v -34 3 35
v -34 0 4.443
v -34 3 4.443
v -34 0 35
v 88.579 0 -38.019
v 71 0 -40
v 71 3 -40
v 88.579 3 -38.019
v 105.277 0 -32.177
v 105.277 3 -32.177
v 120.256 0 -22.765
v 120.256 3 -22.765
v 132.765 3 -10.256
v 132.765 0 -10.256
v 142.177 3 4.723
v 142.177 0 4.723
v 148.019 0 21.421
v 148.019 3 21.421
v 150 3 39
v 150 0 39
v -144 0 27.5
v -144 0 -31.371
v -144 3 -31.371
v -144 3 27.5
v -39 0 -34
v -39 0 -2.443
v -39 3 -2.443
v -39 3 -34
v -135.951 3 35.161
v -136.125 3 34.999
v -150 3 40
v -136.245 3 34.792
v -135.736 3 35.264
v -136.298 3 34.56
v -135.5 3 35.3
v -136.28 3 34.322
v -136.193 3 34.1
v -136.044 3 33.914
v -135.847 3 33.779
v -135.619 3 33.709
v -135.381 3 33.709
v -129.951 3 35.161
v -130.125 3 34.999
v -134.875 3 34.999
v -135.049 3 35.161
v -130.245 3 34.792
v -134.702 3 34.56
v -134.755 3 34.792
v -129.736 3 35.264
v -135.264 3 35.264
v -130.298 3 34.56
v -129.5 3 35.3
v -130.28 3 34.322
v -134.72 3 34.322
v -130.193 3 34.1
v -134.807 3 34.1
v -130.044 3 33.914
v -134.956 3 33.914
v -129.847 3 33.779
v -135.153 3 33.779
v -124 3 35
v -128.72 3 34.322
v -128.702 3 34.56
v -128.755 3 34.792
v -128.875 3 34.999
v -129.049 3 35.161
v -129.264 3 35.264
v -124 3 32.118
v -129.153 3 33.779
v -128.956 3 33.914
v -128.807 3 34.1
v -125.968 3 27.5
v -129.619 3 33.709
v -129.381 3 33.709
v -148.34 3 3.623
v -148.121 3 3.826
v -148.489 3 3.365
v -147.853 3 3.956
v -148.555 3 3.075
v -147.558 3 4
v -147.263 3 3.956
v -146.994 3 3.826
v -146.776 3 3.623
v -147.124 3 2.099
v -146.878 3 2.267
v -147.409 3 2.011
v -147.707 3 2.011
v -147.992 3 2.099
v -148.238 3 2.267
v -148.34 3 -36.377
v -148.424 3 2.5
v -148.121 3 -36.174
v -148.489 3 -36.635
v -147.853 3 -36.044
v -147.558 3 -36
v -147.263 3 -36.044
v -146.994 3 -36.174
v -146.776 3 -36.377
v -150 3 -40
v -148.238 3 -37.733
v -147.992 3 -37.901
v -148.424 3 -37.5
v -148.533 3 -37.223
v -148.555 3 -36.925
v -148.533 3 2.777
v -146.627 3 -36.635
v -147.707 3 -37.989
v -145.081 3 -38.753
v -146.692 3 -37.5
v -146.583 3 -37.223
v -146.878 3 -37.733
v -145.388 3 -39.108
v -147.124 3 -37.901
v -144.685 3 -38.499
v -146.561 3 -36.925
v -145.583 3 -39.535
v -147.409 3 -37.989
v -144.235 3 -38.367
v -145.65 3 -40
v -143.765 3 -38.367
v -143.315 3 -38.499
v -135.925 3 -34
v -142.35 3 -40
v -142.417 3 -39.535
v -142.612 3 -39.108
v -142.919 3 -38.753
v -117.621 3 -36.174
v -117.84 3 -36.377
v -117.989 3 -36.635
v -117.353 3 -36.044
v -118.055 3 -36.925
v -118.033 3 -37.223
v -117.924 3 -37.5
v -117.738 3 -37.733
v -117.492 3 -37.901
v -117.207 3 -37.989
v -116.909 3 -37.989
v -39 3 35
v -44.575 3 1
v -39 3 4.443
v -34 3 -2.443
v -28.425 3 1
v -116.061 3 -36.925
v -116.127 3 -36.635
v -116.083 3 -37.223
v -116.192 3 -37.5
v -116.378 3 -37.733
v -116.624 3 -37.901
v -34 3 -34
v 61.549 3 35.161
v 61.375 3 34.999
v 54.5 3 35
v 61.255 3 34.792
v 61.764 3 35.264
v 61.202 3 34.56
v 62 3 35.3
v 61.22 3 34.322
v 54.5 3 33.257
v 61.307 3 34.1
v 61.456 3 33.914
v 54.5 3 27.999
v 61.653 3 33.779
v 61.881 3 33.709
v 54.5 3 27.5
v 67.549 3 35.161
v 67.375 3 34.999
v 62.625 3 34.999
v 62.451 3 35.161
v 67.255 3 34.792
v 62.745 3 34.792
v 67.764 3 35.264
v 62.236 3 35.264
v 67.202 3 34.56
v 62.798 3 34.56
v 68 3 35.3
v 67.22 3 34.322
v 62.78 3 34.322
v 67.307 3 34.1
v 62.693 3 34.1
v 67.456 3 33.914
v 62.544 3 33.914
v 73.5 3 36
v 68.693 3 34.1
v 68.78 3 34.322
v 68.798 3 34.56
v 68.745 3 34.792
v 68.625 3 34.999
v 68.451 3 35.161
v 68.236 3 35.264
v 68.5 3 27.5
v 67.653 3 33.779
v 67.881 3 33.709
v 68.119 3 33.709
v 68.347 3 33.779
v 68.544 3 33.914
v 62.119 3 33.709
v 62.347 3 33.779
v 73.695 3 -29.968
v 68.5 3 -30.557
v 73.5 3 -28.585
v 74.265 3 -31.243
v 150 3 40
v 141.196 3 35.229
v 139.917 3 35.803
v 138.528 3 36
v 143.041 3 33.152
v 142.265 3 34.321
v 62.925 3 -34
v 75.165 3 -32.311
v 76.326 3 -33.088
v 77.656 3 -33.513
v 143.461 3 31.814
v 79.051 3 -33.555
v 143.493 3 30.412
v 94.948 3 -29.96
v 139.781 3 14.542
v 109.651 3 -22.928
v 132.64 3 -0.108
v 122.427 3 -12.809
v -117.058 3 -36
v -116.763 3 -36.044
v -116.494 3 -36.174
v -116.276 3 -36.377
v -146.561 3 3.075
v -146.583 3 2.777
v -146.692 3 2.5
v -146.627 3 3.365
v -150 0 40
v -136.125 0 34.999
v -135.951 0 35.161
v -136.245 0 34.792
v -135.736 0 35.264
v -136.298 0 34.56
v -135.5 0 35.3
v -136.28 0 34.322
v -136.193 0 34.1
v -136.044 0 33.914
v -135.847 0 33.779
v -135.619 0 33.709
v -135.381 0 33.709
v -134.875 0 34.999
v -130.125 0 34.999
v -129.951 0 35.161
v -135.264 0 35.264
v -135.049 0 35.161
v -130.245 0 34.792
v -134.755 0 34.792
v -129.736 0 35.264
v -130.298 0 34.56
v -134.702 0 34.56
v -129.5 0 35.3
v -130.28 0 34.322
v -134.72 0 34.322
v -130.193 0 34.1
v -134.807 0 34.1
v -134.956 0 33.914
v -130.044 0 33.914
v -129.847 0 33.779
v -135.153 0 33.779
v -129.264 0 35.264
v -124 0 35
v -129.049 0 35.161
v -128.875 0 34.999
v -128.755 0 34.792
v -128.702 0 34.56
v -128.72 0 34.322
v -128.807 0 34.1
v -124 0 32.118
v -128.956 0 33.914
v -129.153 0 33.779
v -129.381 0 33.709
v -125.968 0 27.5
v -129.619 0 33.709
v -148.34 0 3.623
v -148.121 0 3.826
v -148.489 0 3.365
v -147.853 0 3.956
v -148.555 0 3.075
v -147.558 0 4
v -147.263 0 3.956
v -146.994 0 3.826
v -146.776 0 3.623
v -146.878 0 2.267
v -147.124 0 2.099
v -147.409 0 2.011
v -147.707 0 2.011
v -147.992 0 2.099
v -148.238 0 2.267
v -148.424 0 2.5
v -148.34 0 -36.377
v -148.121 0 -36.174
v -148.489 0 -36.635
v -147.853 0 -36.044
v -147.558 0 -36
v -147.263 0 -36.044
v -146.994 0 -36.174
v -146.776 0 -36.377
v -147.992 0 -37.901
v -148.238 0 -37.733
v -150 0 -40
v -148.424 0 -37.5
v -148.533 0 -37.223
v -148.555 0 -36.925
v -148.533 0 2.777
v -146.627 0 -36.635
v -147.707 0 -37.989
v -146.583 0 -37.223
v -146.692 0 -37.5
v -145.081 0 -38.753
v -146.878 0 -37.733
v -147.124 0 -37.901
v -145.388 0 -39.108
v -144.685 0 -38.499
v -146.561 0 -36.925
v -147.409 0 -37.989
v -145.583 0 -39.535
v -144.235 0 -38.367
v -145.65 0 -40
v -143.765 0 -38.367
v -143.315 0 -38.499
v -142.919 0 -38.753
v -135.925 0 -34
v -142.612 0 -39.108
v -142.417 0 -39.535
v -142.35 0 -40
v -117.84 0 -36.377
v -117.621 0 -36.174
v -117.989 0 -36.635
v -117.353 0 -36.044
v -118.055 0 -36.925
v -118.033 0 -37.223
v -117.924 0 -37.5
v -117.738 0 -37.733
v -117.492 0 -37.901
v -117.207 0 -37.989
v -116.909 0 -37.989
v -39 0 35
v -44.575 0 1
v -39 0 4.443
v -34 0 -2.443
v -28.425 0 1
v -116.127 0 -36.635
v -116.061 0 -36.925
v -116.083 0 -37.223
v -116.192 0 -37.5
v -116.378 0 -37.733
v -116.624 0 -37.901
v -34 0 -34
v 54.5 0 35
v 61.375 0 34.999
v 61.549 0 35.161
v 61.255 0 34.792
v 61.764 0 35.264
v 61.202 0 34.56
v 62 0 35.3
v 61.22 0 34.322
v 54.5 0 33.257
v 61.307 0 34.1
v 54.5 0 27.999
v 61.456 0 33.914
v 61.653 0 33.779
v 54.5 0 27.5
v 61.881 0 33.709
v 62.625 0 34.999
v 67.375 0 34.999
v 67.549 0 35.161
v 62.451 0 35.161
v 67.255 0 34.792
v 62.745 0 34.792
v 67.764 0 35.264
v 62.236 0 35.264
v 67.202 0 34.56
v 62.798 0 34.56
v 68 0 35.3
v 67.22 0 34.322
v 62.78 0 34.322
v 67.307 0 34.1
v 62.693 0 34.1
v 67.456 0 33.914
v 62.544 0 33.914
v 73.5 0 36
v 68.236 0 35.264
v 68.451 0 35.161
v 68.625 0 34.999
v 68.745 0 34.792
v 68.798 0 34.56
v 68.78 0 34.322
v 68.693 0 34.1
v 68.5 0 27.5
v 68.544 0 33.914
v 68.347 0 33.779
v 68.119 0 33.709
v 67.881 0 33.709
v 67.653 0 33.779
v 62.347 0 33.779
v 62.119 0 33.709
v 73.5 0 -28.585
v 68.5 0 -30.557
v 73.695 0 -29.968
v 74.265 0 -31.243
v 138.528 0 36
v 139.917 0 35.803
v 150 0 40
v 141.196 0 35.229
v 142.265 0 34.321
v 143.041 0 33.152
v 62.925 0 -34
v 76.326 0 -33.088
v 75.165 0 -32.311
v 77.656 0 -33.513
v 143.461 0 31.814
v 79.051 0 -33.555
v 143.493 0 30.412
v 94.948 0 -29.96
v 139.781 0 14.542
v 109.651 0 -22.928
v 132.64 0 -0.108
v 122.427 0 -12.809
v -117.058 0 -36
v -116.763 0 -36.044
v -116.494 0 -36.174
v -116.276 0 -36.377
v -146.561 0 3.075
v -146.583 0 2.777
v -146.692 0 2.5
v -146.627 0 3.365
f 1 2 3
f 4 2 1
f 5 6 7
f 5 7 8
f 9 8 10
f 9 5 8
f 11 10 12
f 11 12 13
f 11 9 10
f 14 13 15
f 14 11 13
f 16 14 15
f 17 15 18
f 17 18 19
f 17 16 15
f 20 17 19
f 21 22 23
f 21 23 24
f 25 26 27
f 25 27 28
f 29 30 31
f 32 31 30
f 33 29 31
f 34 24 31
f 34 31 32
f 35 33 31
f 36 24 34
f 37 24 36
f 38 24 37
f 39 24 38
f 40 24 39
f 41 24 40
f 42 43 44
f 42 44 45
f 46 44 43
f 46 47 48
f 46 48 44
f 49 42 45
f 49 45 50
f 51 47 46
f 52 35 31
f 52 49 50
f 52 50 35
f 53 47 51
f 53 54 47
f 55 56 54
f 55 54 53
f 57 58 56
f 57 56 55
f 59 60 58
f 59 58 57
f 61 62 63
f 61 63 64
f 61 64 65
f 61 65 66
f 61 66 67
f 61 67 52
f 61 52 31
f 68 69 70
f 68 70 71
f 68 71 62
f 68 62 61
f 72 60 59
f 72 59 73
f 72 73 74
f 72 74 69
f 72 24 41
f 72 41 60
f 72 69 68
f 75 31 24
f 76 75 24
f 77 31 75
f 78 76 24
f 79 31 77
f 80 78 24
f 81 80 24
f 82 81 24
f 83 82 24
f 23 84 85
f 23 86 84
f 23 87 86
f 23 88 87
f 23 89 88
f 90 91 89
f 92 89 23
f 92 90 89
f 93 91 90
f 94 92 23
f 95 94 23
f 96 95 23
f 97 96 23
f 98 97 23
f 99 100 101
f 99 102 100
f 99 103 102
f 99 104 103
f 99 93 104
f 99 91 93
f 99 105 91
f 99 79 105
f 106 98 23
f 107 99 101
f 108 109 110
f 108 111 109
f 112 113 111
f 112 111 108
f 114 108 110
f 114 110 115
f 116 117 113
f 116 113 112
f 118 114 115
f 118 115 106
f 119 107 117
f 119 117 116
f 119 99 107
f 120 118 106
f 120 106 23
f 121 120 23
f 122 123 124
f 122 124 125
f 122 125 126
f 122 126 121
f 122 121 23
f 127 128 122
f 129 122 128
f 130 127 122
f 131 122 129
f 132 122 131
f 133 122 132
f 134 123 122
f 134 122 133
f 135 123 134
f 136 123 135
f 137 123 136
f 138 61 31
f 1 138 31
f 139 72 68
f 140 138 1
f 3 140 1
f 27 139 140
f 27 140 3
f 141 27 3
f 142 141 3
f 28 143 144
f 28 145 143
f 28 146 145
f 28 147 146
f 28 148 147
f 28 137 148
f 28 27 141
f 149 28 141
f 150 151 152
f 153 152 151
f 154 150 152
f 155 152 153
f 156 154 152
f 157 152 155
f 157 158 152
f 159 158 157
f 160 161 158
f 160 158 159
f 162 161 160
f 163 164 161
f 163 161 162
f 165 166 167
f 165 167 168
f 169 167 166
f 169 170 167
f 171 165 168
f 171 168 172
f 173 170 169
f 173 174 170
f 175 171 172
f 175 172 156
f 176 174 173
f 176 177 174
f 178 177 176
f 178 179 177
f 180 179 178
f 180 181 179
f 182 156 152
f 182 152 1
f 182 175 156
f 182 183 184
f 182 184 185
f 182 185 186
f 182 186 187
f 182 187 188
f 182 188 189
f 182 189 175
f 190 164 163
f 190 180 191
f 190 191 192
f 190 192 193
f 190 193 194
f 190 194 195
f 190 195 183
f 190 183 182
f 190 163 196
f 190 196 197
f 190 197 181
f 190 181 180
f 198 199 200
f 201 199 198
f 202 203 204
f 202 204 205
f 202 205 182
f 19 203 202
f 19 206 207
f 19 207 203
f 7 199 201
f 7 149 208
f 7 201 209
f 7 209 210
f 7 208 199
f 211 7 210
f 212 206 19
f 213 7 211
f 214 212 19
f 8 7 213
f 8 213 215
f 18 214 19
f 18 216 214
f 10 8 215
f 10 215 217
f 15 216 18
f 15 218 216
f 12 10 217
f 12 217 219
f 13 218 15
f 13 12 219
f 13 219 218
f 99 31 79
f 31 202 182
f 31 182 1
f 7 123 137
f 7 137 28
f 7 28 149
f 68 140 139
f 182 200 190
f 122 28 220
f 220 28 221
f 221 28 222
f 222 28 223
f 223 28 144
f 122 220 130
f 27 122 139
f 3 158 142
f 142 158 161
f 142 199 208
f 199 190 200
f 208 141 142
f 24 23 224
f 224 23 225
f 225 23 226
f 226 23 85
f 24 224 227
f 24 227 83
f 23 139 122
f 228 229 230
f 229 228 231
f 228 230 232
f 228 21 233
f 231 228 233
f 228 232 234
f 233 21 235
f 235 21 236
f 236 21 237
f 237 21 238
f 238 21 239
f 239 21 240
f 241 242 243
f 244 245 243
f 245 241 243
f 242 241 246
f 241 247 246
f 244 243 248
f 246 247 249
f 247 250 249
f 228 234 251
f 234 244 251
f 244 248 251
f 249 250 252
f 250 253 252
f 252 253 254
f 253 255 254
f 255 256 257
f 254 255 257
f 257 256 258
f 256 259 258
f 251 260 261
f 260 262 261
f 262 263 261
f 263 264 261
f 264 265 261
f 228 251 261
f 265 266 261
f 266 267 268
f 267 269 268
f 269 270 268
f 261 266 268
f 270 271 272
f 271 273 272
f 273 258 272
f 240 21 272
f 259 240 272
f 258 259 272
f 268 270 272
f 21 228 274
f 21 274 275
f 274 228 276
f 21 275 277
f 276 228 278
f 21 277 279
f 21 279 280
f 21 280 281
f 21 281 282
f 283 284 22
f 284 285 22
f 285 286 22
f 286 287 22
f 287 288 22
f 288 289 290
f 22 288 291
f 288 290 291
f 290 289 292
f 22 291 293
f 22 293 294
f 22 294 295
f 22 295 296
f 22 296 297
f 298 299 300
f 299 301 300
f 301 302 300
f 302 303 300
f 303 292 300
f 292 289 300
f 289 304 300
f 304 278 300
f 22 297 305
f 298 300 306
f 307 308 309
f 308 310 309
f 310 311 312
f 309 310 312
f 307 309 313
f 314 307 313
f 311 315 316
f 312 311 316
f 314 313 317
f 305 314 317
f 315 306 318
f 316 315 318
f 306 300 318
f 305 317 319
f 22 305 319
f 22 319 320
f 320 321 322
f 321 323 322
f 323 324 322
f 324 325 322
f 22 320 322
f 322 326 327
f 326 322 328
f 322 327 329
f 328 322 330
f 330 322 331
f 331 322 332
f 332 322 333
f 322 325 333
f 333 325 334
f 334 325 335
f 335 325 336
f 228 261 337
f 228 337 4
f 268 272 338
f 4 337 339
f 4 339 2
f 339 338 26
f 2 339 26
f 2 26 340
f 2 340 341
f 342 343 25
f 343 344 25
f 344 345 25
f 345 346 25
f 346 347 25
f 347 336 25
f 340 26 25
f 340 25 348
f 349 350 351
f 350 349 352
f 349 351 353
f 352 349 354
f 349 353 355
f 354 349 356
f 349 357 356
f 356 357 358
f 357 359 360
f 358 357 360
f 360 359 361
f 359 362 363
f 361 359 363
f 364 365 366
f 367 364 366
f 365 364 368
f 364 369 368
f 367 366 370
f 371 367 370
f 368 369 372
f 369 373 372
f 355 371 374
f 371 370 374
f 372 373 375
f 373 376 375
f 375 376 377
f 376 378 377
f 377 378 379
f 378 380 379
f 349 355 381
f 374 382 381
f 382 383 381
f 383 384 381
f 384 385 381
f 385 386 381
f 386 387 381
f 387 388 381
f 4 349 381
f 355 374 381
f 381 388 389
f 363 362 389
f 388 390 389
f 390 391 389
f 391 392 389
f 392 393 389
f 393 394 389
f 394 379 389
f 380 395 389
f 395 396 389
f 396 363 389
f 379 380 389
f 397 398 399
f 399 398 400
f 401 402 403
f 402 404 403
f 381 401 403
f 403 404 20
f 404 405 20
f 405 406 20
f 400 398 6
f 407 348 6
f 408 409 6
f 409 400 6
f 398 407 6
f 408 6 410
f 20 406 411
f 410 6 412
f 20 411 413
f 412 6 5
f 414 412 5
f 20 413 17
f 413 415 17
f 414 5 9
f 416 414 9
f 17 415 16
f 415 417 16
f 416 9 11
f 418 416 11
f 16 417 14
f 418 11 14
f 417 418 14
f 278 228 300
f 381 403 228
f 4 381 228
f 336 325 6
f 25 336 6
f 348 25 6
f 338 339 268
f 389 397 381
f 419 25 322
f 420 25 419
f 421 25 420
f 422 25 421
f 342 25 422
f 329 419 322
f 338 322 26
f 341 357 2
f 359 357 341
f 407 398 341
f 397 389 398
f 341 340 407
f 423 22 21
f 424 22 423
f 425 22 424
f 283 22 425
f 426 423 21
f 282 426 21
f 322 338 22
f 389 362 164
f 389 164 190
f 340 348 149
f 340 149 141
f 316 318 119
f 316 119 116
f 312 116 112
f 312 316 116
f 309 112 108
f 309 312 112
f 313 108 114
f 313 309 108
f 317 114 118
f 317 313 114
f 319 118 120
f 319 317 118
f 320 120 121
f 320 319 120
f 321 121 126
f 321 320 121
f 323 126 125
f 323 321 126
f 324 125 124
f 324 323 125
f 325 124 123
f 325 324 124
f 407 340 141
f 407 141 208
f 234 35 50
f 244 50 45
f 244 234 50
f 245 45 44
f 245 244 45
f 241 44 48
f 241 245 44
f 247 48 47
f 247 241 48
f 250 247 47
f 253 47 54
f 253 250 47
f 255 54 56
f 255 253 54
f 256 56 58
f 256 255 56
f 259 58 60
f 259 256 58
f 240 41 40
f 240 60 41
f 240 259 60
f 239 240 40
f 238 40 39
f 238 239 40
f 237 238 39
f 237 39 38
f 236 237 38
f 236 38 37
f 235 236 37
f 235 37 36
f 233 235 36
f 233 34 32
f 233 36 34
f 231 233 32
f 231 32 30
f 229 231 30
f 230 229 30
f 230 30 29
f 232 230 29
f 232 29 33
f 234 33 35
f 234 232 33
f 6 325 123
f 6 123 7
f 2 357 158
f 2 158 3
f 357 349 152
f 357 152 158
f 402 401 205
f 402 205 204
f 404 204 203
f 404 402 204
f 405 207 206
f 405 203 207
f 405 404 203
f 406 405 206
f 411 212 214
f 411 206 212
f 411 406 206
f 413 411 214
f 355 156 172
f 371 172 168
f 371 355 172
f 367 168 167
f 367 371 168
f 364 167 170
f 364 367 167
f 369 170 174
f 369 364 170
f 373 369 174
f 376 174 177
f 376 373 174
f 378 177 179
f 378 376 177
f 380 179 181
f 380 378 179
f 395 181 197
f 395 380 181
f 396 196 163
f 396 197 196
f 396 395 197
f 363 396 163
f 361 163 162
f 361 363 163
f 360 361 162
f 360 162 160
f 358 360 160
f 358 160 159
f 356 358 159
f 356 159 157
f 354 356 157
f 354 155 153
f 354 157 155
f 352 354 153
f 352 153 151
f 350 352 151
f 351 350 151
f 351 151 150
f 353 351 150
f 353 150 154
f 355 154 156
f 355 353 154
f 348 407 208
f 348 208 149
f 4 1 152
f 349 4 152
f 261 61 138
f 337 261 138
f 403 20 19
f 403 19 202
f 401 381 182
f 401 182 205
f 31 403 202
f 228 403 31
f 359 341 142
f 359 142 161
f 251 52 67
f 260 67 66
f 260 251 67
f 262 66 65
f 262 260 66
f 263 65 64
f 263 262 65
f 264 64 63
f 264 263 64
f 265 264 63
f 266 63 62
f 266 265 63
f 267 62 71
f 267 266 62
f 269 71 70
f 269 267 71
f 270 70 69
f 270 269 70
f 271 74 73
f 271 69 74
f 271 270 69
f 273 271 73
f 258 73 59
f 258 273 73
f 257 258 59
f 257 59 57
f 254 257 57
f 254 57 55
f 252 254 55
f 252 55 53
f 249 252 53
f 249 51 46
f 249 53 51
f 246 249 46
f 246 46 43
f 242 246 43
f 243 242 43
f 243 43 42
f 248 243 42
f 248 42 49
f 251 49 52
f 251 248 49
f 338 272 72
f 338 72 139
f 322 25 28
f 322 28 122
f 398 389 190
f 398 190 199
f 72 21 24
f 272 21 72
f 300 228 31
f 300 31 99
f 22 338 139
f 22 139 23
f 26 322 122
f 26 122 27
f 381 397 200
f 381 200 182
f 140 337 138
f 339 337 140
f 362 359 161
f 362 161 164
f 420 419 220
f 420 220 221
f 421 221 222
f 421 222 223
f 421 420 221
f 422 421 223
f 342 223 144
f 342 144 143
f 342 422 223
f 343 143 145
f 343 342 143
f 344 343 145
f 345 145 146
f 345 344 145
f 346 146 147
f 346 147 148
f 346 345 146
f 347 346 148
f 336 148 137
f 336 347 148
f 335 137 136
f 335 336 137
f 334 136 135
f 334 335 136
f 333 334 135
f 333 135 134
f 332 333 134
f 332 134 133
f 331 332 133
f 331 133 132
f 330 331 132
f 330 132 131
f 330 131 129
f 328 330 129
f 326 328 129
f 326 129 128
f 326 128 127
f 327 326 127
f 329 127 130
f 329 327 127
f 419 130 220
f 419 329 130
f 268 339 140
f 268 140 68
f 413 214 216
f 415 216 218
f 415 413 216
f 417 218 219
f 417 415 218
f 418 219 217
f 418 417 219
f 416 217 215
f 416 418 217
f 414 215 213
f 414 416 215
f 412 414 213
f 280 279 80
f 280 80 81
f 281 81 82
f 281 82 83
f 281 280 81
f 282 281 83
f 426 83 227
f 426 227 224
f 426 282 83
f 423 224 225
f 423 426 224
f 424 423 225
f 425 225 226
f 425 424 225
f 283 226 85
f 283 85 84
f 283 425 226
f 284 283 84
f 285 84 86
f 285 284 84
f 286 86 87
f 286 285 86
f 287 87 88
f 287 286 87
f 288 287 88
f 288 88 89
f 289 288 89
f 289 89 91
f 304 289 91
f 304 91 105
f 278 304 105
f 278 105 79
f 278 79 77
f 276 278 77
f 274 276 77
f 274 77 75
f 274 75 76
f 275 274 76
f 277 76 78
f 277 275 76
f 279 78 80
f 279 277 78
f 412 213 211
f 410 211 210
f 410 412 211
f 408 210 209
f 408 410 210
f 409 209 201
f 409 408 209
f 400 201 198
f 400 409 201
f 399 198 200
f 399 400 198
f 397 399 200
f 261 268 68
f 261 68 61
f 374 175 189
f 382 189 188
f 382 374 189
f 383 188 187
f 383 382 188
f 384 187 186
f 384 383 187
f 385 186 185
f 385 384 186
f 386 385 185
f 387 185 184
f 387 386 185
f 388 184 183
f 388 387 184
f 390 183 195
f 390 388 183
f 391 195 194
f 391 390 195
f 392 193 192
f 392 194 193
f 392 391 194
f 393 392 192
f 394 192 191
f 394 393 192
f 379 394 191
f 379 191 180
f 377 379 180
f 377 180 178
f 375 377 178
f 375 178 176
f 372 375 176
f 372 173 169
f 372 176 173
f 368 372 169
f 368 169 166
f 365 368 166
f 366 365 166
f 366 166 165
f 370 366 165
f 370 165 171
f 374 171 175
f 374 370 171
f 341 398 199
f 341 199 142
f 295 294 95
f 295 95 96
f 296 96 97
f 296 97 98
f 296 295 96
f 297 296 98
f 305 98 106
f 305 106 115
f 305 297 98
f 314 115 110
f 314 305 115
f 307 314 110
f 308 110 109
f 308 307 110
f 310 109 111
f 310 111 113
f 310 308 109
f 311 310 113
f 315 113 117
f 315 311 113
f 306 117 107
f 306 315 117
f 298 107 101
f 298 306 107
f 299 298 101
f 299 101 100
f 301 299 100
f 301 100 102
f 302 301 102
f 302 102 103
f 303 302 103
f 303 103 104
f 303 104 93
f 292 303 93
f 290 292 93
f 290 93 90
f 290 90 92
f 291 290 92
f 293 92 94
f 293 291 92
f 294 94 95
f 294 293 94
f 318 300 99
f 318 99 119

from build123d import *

# Parameters (mm, degrees)
SKETCH_1_R          = 1
EXTRUDE_1_DEPTH     = 3
SKETCH_4_R          = 0.8
SKETCH_4_R_2        = 1.65
CUT_EXTRUDE_2_DEPTH = 18
SKETCH_6_W          = 178.5
SKETCH_6_H          = 1
EXTRUDE_2_DEPTH     = 3


with BuildPart() as part:
    # 草图1 → 凸台-拉伸1 (new body)
    with BuildSketch(Plane(origin=(0, 0, 0), x_dir=(1, 0, 0), z_dir=(0, 1, 0))):
        with BuildLine():
            Line((-150, 40), (71, 40))
            ThreePointArc((71, 40), (126.861435714, 16.861435714), (150, -39))
            Line((150, -39), (150, -40))
            Line((150, -40), (-150, -40))
            Line((-150, -40), (-150, 40))
        make_face()
        with Locations(Location((-117.057778193, 37, 0), (0, 0, 270))):
            Circle(SKETCH_1_R, mode=Mode.SUBTRACT)
        with Locations(Location((-147.557778193, 37, 0), (0, 0, 270))):
            Circle(SKETCH_1_R, mode=Mode.SUBTRACT)
        with Locations(Location((-147.557778193, -3, 0), (0, 0, 270))):
            Circle(SKETCH_1_R, mode=Mode.SUBTRACT)
    extrude(amount=EXTRUDE_1_DEPTH)

    # 草图4 → 切除-拉伸2 (cut)
    with BuildSketch(Plane(origin=(0, 0, 0), x_dir=(1, 0, 0), z_dir=(0, 1, 0))):
        Polygon((-34, 2.44312071), (62.924700675, 34), (-34, 34), align=None)
        Polygon((68.5, -27.5), (68.5, 30.55687929), (-28.424700675, -1), (54.5, -27.998739755), (54.5, -27.5), align=None)
        Polygon((-39, 2.44312071), (-39, 34), (-135.924700675, 34), align=None)
        with Locations(Location((68, -34.5, 0), (0, 0, 270))):
            Circle(SKETCH_4_R)
        Polygon((54.5, -36), (54.5, -33.257074199), (-34, -4.44312071), (-34, -36), align=None)
        Polygon((-125.968156468, -27.5), (-44.575299325, -1), (-144, 31.370832778), (-144, -27.5), align=None)
        Polygon((-39, -36), (-39, -4.44312071), (-124, -32.117539315), (-124, -36), align=None)
        with BuildLine():
            Line((73.5, 28.585131501), (73.5, -36))
            Line((73.5, -36), (138.527772065, -36))
            ThreePointArc((138.527772065, -36), (142.265497073, -34.321055821), (143.493049422, -30.411764706))
            ThreePointArc((143.493049422, -30.411764706), (122.427421924, 12.809461243), (79.051470588, 33.554626464))
            ThreePointArc((79.051470588, 33.554626464), (75.165135156, 32.310541072), (73.5, 28.585131501))
        make_face()
        with Locations(Location((-129.5, -34.5, 0), (0, 0, 270))):
            Circle(SKETCH_4_R)
        with Locations(Location((-135.5, -34.5, 0), (0, 0, 270))):
            Circle(SKETCH_4_R)
        with Locations(Location((62, -34.5, 0), (0, 0, 270))):
            Circle(SKETCH_4_R)
        with Locations((-144, 40)):
            Circle(SKETCH_4_R_2)
    extrude(amount=CUT_EXTRUDE_2_DEPTH, mode=Mode.SUBTRACT)

    # 草图6 → 凸台-拉伸2 (add, through all)
    with BuildSketch(Plane(origin=(0, 3, 0), x_dir=(1, 0, 0), z_dir=(0, 1, 0))):
        with Locations((-34.75, -35.5)):
            Rectangle(SKETCH_6_W, SKETCH_6_H)
    extrude(amount=-EXTRUDE_2_DEPTH)


solid = part.part
